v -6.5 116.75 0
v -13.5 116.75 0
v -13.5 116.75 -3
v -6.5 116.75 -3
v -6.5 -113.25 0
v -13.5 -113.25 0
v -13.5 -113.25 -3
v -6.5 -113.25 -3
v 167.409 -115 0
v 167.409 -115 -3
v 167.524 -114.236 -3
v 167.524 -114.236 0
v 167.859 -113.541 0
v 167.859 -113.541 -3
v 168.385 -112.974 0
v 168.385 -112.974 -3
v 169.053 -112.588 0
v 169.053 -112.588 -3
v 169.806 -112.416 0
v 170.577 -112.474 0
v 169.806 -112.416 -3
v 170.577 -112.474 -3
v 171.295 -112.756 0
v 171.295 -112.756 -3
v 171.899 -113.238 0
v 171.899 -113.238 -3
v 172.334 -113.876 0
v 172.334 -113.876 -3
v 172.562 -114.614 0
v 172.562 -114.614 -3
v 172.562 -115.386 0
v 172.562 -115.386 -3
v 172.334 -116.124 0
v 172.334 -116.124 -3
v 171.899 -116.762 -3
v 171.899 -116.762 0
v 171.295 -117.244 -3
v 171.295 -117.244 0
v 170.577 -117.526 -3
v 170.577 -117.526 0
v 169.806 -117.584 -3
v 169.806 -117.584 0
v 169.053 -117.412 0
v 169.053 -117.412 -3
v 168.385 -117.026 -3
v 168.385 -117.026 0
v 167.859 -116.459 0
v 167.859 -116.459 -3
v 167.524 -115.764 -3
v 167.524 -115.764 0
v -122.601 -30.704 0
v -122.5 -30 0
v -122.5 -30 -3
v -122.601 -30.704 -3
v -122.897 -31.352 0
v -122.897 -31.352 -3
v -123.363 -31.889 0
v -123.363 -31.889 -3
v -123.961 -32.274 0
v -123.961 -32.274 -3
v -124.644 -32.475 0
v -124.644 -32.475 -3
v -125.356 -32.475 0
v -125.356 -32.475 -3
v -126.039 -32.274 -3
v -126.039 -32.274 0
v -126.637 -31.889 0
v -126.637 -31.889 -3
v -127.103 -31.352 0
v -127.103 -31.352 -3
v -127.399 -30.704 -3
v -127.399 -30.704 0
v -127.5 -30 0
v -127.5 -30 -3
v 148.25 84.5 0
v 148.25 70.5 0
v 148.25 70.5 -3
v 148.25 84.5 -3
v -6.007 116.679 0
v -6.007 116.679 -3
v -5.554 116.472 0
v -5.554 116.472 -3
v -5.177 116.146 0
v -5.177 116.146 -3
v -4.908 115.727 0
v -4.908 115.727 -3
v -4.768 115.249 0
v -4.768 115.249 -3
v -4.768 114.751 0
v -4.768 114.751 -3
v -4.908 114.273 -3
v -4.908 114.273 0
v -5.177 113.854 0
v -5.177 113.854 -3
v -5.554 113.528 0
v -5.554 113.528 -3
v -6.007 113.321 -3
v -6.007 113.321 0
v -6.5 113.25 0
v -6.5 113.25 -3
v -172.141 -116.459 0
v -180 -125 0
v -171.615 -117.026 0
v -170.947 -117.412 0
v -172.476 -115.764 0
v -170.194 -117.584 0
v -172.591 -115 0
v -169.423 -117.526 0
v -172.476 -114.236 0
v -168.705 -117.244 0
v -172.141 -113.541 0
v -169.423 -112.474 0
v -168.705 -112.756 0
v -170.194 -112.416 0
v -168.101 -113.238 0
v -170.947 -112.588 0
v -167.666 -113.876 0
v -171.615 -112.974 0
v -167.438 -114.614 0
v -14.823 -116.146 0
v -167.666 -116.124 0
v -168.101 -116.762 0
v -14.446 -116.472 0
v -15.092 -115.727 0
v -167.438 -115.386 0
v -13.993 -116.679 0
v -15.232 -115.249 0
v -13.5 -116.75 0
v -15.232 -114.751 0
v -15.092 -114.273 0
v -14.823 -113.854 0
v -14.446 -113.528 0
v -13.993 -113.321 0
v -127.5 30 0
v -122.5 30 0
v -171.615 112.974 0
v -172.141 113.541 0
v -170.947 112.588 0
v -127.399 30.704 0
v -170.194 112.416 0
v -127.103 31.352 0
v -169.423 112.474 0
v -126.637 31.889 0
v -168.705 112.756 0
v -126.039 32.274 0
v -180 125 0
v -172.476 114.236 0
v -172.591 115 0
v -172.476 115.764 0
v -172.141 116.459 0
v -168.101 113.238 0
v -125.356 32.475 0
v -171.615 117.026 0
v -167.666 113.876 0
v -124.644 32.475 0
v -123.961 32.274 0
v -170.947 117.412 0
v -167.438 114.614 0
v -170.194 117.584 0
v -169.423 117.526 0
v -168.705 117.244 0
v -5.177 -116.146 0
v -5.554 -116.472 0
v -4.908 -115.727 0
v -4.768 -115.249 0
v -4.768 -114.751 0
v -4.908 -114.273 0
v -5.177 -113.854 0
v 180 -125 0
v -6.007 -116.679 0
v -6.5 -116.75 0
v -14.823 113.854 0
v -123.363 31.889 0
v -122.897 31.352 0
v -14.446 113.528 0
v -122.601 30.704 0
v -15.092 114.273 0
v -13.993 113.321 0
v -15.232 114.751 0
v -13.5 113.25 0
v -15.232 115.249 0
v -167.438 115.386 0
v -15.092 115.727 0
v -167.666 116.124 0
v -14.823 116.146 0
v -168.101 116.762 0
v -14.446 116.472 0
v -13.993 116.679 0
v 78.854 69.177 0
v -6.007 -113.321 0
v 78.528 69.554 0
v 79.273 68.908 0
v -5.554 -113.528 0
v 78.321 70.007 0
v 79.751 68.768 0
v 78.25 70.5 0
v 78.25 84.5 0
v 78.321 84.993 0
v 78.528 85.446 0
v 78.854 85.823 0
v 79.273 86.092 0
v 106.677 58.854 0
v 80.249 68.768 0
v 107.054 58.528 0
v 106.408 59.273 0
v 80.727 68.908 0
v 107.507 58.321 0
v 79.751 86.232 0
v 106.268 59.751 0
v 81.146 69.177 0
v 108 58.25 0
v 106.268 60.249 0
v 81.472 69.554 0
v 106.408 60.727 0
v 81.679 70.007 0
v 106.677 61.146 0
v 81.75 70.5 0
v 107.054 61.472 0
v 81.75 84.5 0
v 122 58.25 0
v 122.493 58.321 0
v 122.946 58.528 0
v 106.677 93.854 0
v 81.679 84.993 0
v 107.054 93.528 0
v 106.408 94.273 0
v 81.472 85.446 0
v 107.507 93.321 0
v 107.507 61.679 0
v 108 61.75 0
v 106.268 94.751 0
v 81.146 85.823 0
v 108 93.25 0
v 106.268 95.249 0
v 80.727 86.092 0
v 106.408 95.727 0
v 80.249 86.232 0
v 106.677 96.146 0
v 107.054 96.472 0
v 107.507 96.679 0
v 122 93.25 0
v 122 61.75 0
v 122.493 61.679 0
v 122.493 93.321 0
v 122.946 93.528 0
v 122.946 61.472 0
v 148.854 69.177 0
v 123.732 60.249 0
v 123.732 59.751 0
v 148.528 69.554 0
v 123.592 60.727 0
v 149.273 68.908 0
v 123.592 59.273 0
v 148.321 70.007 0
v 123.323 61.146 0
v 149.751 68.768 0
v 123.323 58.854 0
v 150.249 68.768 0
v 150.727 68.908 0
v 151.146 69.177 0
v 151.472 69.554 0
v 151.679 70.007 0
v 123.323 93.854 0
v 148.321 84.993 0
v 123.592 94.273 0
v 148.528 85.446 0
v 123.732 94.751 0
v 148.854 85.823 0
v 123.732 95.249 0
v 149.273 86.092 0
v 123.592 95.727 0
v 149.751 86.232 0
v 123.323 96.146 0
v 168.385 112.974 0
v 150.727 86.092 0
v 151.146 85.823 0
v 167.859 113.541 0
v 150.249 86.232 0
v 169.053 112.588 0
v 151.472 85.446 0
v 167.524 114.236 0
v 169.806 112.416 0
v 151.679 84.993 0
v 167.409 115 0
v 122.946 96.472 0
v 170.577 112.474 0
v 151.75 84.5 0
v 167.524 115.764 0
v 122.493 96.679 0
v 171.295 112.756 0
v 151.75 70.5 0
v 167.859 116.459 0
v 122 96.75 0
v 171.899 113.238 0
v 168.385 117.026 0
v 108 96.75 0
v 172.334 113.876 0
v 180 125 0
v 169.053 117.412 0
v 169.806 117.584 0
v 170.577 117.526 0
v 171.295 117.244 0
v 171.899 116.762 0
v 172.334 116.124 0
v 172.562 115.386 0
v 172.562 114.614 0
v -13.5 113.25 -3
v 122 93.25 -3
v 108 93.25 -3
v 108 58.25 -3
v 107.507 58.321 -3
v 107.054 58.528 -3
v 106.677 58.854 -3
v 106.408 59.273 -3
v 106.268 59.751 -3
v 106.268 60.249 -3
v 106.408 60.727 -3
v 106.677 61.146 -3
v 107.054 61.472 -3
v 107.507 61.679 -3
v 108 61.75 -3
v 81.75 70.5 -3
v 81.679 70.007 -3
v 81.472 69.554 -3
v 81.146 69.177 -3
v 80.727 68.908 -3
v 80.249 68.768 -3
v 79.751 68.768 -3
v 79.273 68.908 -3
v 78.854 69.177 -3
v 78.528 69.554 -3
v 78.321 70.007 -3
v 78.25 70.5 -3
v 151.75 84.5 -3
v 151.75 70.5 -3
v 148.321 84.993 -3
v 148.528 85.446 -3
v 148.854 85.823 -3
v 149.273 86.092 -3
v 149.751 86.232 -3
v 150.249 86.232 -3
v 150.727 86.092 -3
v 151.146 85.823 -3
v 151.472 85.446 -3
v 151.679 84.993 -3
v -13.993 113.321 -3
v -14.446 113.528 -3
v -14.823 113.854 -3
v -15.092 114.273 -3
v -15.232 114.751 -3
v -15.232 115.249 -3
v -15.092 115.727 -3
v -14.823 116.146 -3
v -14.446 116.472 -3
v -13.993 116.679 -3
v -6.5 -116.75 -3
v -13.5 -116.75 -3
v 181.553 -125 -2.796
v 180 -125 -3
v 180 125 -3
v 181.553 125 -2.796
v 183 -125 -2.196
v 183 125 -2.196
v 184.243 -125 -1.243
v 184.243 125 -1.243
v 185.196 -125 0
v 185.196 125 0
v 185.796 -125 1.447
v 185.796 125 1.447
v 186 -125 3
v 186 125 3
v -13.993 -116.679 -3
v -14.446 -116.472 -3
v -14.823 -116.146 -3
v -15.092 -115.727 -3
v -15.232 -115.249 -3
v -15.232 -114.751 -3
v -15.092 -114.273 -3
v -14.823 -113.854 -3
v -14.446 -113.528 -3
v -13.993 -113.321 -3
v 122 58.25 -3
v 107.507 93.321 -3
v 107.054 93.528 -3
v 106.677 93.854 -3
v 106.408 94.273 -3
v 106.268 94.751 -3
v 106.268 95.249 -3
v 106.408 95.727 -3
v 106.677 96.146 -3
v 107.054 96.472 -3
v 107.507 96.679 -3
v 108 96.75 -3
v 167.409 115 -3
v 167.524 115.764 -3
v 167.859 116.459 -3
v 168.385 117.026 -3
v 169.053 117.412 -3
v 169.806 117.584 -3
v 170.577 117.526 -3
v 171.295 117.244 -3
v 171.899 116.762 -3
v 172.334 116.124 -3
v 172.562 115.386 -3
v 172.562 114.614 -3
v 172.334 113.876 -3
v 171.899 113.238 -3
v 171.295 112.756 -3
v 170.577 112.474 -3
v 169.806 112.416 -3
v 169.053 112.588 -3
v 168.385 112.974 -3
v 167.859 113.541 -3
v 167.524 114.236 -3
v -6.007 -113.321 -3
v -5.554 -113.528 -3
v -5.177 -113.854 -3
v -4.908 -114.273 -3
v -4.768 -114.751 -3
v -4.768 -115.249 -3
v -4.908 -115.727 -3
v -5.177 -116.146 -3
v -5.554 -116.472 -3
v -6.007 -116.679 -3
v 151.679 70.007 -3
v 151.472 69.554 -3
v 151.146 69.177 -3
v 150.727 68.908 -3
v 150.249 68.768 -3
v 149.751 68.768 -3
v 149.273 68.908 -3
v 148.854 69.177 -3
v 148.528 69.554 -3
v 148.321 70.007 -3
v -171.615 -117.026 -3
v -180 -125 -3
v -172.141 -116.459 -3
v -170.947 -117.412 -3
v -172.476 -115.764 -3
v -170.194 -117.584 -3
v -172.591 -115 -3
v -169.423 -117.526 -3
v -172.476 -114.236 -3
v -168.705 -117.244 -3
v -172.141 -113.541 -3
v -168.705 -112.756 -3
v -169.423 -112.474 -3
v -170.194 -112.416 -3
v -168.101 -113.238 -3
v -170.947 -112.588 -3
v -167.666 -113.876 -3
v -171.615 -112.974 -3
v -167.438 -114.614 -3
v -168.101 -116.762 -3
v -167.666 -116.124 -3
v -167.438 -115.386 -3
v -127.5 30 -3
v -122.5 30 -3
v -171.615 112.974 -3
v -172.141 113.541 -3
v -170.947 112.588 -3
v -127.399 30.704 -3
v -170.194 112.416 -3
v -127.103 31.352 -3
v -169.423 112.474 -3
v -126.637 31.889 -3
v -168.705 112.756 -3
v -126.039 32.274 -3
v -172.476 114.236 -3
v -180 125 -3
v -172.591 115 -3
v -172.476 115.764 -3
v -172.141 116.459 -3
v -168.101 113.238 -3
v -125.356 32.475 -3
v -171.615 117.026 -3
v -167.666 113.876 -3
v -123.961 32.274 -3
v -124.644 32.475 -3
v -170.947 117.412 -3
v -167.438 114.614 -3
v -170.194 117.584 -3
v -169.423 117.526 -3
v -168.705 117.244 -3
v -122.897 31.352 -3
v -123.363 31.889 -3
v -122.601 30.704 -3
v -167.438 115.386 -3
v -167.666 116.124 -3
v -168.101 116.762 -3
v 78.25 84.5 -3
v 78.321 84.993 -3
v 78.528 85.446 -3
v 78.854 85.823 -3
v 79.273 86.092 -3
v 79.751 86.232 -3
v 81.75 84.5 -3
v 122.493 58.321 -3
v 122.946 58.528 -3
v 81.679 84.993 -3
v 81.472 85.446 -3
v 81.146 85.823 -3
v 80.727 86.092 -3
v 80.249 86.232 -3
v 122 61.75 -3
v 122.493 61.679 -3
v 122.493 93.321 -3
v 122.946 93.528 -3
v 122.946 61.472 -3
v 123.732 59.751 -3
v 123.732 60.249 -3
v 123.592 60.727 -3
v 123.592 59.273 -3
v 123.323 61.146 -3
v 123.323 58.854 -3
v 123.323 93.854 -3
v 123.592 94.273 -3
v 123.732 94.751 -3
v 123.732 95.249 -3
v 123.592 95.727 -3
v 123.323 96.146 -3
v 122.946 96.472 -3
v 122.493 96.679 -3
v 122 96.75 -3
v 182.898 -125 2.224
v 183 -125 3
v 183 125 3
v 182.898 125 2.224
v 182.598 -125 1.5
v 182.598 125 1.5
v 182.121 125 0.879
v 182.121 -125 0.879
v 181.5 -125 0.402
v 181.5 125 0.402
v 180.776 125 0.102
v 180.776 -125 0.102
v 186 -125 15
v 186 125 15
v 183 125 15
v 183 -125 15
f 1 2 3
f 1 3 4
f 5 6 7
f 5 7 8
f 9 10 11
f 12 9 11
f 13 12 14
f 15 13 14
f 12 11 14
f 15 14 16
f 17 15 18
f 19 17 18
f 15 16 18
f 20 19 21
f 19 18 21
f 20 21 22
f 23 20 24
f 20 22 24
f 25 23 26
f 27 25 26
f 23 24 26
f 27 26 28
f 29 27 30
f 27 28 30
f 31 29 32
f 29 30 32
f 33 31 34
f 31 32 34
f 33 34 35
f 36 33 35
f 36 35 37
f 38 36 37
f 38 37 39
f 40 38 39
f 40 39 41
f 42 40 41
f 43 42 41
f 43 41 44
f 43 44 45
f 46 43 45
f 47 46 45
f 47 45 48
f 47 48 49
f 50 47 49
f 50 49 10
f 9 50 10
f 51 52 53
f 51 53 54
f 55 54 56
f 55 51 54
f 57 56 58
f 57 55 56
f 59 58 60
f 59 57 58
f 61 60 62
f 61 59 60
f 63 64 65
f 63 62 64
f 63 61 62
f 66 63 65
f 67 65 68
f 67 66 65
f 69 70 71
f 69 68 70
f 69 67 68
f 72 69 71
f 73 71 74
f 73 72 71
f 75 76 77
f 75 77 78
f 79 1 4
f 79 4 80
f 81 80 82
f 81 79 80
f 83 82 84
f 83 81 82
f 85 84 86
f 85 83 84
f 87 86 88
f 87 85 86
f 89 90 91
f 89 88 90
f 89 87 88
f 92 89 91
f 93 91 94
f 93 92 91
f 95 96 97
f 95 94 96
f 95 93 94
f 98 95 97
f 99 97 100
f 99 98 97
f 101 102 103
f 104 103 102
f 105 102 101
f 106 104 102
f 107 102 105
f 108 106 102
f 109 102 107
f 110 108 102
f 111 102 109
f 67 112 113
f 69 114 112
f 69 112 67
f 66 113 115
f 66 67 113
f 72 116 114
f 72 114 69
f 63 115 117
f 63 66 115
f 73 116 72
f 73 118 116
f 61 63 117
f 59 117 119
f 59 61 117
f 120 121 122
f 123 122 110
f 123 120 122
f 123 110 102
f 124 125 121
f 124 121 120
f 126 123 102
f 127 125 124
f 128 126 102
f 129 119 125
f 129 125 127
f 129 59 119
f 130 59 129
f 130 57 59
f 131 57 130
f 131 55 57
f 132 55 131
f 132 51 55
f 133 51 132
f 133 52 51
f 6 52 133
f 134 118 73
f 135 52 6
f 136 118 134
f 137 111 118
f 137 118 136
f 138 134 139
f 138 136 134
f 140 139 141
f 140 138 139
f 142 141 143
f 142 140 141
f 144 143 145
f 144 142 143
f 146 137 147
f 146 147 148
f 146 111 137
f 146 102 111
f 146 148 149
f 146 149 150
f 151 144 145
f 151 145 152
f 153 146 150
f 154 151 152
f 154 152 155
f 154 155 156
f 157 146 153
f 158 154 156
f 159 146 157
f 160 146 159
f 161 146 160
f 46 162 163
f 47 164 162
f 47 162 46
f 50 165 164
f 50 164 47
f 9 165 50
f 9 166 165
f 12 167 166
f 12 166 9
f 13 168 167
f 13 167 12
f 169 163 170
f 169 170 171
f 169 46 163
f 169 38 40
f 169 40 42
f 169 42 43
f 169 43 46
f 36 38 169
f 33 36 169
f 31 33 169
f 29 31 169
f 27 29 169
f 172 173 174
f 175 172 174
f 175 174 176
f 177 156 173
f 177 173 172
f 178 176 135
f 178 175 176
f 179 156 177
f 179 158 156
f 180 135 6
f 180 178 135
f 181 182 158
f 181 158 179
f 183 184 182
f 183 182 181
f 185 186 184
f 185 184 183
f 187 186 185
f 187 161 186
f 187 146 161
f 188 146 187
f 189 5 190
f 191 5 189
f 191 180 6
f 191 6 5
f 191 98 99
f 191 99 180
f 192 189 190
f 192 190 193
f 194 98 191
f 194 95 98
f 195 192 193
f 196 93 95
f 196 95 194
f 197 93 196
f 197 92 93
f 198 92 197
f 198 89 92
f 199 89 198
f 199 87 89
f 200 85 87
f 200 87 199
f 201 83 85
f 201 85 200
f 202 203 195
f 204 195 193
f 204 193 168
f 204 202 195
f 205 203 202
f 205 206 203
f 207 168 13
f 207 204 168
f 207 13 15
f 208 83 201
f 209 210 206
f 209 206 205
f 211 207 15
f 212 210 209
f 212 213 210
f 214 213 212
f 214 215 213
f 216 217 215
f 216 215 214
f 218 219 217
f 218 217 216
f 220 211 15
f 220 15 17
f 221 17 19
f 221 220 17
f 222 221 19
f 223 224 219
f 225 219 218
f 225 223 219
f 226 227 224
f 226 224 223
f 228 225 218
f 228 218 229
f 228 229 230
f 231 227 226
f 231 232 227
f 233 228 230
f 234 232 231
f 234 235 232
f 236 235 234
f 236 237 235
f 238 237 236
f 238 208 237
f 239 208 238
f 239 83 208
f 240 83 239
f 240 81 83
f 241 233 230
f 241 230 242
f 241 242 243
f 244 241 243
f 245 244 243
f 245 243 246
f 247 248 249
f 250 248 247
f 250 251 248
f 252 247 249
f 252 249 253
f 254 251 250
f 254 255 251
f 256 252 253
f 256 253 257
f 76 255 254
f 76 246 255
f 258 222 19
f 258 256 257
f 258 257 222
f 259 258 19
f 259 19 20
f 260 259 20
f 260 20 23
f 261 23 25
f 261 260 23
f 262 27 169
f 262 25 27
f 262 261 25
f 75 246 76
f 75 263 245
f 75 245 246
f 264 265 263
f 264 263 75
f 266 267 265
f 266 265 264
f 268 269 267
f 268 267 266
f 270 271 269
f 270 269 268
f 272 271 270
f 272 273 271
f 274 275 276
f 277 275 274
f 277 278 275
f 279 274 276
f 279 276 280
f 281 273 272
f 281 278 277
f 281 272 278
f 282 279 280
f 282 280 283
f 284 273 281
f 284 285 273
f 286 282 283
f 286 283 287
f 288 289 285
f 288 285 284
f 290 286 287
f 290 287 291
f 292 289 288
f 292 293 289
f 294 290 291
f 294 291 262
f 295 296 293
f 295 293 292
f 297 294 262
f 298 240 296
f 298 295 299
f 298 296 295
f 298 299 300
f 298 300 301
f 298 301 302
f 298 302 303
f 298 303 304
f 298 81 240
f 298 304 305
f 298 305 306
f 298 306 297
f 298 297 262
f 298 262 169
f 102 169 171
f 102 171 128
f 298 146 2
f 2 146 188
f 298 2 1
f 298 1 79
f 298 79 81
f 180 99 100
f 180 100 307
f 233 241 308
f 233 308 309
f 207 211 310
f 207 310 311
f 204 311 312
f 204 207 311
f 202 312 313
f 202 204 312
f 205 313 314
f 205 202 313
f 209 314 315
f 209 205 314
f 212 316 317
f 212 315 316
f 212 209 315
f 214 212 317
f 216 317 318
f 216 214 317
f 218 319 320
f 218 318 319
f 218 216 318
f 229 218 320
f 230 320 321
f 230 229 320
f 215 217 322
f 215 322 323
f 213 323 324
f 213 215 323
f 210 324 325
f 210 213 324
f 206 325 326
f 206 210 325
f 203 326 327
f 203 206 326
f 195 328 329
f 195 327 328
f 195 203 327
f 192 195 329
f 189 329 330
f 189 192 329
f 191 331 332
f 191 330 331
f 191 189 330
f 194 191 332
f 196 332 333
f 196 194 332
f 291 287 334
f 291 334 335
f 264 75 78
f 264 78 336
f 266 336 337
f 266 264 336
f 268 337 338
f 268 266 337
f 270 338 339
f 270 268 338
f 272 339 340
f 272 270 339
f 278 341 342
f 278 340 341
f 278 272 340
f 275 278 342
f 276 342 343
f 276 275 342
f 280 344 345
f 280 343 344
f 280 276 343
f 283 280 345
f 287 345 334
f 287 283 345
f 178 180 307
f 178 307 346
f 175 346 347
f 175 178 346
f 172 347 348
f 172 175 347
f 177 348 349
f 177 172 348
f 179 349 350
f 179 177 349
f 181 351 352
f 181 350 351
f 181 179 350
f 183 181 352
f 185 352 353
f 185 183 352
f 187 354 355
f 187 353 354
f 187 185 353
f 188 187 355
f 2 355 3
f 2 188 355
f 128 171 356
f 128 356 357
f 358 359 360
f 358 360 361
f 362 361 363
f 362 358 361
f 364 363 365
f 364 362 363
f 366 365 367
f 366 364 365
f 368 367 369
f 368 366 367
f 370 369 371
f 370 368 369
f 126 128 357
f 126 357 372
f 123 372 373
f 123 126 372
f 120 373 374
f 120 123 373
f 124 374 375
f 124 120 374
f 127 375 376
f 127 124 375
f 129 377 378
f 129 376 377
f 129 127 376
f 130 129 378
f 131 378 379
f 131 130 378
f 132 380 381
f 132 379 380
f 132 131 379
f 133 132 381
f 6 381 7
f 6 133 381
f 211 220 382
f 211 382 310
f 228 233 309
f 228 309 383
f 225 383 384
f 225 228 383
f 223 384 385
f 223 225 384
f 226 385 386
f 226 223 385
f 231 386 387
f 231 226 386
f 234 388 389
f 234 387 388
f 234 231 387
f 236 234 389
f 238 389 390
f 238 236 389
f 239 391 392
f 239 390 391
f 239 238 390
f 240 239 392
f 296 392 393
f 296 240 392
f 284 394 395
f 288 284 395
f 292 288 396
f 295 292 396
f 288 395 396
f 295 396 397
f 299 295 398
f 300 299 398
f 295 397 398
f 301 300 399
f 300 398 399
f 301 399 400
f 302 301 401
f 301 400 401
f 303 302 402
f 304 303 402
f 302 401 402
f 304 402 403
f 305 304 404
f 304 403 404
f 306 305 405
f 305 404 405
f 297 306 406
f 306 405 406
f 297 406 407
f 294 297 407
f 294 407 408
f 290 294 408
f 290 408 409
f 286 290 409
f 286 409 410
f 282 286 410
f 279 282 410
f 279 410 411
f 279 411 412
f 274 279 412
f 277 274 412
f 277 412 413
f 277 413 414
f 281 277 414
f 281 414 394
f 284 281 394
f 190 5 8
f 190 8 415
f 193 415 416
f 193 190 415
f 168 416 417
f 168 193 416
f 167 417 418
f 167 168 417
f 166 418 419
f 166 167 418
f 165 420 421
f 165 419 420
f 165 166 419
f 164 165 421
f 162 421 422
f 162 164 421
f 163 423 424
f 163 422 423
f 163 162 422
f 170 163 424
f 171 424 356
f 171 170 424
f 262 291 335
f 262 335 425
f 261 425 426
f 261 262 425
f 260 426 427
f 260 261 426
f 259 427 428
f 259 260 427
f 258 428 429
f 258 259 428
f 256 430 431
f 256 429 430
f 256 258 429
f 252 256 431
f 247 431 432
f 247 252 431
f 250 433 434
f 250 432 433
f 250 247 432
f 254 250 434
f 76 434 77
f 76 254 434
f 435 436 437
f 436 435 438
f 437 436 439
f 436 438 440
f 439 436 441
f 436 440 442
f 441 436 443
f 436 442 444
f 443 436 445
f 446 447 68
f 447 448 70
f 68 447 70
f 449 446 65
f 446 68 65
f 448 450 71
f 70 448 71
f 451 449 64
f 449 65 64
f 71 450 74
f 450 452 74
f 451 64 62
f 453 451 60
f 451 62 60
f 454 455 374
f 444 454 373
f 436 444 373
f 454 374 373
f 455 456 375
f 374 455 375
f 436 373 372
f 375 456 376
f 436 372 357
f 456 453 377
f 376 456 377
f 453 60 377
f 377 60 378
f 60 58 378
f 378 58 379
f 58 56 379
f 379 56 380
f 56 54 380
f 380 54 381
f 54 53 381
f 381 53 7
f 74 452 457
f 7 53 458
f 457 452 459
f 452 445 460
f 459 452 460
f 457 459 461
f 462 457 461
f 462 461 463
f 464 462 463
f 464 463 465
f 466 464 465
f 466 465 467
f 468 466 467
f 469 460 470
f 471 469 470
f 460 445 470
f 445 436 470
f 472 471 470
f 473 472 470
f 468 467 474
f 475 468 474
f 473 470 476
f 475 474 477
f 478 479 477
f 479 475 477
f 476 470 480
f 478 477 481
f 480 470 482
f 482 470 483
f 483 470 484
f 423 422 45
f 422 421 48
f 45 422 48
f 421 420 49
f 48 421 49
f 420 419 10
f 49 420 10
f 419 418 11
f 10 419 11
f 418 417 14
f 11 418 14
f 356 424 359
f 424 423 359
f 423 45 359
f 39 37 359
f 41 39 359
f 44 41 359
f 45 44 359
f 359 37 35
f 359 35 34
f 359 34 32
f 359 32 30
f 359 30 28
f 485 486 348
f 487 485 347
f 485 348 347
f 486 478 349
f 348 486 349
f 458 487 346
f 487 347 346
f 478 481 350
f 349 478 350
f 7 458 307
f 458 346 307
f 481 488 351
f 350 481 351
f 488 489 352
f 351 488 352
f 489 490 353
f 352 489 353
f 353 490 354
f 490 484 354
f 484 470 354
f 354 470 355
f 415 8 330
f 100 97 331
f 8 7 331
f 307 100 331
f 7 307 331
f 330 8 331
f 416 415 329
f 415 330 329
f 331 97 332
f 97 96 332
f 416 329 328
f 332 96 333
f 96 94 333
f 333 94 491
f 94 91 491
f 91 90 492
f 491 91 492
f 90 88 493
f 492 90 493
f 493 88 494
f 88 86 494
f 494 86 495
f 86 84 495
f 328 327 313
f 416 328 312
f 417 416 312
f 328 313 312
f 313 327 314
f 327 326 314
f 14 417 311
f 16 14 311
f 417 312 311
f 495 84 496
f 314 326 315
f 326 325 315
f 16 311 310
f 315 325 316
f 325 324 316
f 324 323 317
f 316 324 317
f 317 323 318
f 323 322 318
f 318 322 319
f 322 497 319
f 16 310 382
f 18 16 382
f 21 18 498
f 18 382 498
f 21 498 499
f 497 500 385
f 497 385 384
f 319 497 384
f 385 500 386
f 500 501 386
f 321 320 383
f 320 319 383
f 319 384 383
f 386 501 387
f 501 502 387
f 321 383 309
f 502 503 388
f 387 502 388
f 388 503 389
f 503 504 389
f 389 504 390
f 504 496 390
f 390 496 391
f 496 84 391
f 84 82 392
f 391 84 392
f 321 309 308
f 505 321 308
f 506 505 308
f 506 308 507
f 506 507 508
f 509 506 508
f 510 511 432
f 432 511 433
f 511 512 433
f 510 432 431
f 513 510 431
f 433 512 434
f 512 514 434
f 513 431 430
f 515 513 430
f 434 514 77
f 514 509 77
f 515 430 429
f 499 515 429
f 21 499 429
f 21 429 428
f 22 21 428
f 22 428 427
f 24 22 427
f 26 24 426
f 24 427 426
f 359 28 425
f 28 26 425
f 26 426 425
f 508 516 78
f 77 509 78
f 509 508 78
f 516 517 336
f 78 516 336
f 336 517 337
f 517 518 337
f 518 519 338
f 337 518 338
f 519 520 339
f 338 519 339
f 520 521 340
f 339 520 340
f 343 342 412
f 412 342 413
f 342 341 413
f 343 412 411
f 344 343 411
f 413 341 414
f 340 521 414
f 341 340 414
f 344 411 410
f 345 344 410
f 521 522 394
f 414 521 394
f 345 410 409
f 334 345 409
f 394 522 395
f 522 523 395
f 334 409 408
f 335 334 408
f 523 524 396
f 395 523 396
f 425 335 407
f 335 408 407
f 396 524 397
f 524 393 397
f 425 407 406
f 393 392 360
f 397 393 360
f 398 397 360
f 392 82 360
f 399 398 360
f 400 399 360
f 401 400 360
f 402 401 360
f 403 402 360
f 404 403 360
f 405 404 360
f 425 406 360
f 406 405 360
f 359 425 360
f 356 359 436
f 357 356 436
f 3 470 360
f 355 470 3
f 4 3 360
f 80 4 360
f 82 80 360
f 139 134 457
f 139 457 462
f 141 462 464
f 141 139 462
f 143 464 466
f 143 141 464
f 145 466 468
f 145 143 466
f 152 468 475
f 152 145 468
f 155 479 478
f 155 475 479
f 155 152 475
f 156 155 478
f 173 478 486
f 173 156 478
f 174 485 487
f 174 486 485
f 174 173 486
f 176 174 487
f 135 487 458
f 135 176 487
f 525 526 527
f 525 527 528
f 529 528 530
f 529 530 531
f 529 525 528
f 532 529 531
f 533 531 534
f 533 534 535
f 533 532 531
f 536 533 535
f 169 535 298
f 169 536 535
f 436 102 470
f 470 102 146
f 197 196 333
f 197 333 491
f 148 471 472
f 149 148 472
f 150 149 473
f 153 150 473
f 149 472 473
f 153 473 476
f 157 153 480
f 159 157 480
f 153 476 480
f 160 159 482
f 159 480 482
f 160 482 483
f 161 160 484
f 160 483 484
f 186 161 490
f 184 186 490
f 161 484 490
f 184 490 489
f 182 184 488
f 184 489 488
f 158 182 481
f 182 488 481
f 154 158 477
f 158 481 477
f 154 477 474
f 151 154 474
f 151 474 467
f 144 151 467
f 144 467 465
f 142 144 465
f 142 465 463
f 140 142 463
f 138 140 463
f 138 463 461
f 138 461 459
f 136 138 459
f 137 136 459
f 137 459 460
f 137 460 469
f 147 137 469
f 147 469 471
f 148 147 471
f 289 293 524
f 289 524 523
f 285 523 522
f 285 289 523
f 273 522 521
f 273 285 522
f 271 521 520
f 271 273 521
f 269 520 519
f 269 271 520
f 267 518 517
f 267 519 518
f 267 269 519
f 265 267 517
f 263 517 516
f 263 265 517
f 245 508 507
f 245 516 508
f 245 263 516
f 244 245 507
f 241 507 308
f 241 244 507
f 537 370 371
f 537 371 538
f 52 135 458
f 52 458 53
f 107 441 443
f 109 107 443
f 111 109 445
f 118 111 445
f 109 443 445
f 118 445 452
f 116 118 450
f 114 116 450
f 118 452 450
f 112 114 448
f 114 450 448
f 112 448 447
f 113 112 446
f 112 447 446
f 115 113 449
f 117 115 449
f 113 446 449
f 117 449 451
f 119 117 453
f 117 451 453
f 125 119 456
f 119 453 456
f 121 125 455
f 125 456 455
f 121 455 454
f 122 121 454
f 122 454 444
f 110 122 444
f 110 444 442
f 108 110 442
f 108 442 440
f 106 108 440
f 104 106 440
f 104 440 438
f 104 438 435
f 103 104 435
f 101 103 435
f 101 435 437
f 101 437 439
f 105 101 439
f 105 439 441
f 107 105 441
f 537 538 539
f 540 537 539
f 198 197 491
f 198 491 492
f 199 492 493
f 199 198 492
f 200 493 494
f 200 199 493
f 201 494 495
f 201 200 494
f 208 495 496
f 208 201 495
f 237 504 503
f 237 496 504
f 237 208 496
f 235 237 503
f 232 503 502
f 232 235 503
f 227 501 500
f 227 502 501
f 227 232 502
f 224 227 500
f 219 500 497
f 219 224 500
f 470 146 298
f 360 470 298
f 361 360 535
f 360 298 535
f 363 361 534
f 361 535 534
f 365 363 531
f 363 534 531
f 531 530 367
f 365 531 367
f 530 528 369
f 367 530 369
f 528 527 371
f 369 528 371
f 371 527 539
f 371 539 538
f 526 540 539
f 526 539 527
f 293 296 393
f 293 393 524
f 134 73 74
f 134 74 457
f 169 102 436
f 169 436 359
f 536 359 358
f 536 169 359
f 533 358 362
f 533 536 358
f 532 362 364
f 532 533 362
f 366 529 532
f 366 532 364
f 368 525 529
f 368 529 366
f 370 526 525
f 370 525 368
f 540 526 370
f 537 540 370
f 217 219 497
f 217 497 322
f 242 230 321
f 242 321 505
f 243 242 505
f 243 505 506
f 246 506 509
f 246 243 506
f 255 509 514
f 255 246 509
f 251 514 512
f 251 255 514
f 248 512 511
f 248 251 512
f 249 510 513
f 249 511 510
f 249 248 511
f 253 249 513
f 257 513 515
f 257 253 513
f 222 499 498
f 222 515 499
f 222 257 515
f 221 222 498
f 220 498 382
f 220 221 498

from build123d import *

# Parameters (mm, degrees)
SKETCH1_W                  = 360
SKETCH1_H                  = 250
BASE_FLANGE1_DEPTH         = 3
F_6_0_204_DIAMETER_SLOT1_D = 5.1816
CUT_EXTRUDE1_DEPTH         = 10
CUT_EXTRUDE2_DEPTH         = 10
CUT_EXTRUDE4_DEPTH         = 10
CUT_EXTRUDE5_DEPTH         = 10
CUT_EXTRUDE6_DEPTH         = 10
CUT_EXTRUDE7_DEPTH         = 10
CUT_EXTRUDE8_DEPTH         = 10
EDGE_FLANGE1_DEPTH         = 250


# Sheet-metal steps are written as plain solids
with BuildPart() as part:
    # Sketch1 → Base-Flange1 (new body)
    with BuildSketch(Plane.XY):
        Rectangle(SKETCH1_W, SKETCH1_H)
    extrude(amount=-BASE_FLANGE1_DEPTH)

    # #6 (0.204) Diameter Slot1 (through all)
    with Locations(Plane.XY):
        with Locations((-170, -115), (-170, 115), (170, 115), (170, -115)):
            Hole(F_6_0_204_DIAMETER_SLOT1_D / 2)

    # Sketch8 → Cut-Extrude1 (cut)
    with BuildSketch(Plane.XY):
        with BuildLine():
            Line((-13.5, -113.25), (-6.5, -113.25))
            ThreePointArc((-6.5, -113.25), (-4.75, -115), (-6.5, -116.75))
            Line((-6.5, -116.75), (-13.5, -116.75))
            ThreePointArc((-13.5, -116.75), (-15.25, -115), (-13.5, -113.25))
        make_face()
    extrude(amount=-CUT_EXTRUDE1_DEPTH, mode=Mode.SUBTRACT)

    # Sketch9 → Cut-Extrude2 (cut)
    with BuildSketch(Plane.XY):
        with BuildLine():
            Line((-13.5, 116.75), (-6.5, 116.75))
            ThreePointArc((-6.5, 116.75), (-4.75, 115), (-6.5, 113.25))
            Line((-6.5, 113.25), (-13.5, 113.25))
            ThreePointArc((-13.5, 113.25), (-15.25, 115), (-13.5, 116.75))
        make_face()
    extrude(amount=-CUT_EXTRUDE2_DEPTH, mode=Mode.SUBTRACT)

    # Sketch10 → Cut-Extrude4 (cut)
    with BuildSketch(Plane.XY):
        with BuildLine():
            Line((151.75, 84.5), (151.75, 70.5))
            ThreePointArc((151.75, 70.5), (150, 68.75), (148.25, 70.5))
            Line((148.25, 70.5), (148.25, 84.5))
            ThreePointArc((148.25, 84.5), (150, 86.25), (151.75, 84.5))
        make_face()
    extrude(amount=-CUT_EXTRUDE4_DEPTH, mode=Mode.SUBTRACT)

    # Sketch11 → Cut-Extrude5 (cut)
    with BuildSketch(Plane.XY):
        with BuildLine():
            Line((108, 96.75), (122, 96.75))
            ThreePointArc((122, 96.75), (123.75, 95), (122, 93.25))
            Line((122, 93.25), (108, 93.25))
            ThreePointArc((108, 93.25), (106.25, 95), (108, 96.75))
        make_face()
    extrude(amount=-CUT_EXTRUDE5_DEPTH, mode=Mode.SUBTRACT)

    # Sketch12 → Cut-Extrude6 (cut)
    with BuildSketch(Plane.XY):
        with BuildLine():
            Line((108, 61.75), (122, 61.75))
            ThreePointArc((122, 61.75), (123.75, 60), (122, 58.25))
            Line((122, 58.25), (108, 58.25))
            ThreePointArc((108, 58.25), (106.25, 60), (108, 61.75))
        make_face()
    extrude(amount=-CUT_EXTRUDE6_DEPTH, mode=Mode.SUBTRACT)

    # Sketch13 → Cut-Extrude7 (cut)
    with BuildSketch(Plane.XY):
        with BuildLine():
            Line((81.75, 84.5), (81.75, 70.5))
            ThreePointArc((81.75, 70.5), (80, 68.75), (78.25, 70.5))
            Line((78.25, 70.5), (78.25, 84.5))
            ThreePointArc((78.25, 84.5), (80, 86.25), (81.75, 84.5))
        make_face()
    extrude(amount=-CUT_EXTRUDE7_DEPTH, mode=Mode.SUBTRACT)

    # Sketch14 → Cut-Extrude8 (cut)
    with BuildSketch(Plane.XY):
        with BuildLine():
            Line((-122.5, 30), (-122.5, -30))
            ThreePointArc((-122.5, -30), (-125, -32.5), (-127.5, -30))
            Line((-127.5, -30), (-127.5, 30))
            ThreePointArc((-127.5, 30), (-125, 32.5), (-122.5, 30))
        make_face()
    extrude(amount=-CUT_EXTRUDE8_DEPTH, mode=Mode.SUBTRACT)

    # Edge-Flange1 section (across the edge) → Edge-Flange1 (add)
    with BuildSketch(Plane(origin=(183, -125, 0), x_dir=(-1, 0, 0), z_dir=(0, 1, 0))):
        with BuildLine():
            Line((-3, 3), (-3, 15))
            Line((-3, 15), (0, 15))
            Line((0, 15), (0, 3))
            ThreePointArc((0, 3), (0.878679656, 0.878679656), (3, 0))
            Line((3, 0), (3, -3))
            ThreePointArc((3, -3), (-1.242640687, -1.242640687), (-3, 3))
        make_face()
    extrude(amount=EDGE_FLANGE1_DEPTH)


solid = part.part
